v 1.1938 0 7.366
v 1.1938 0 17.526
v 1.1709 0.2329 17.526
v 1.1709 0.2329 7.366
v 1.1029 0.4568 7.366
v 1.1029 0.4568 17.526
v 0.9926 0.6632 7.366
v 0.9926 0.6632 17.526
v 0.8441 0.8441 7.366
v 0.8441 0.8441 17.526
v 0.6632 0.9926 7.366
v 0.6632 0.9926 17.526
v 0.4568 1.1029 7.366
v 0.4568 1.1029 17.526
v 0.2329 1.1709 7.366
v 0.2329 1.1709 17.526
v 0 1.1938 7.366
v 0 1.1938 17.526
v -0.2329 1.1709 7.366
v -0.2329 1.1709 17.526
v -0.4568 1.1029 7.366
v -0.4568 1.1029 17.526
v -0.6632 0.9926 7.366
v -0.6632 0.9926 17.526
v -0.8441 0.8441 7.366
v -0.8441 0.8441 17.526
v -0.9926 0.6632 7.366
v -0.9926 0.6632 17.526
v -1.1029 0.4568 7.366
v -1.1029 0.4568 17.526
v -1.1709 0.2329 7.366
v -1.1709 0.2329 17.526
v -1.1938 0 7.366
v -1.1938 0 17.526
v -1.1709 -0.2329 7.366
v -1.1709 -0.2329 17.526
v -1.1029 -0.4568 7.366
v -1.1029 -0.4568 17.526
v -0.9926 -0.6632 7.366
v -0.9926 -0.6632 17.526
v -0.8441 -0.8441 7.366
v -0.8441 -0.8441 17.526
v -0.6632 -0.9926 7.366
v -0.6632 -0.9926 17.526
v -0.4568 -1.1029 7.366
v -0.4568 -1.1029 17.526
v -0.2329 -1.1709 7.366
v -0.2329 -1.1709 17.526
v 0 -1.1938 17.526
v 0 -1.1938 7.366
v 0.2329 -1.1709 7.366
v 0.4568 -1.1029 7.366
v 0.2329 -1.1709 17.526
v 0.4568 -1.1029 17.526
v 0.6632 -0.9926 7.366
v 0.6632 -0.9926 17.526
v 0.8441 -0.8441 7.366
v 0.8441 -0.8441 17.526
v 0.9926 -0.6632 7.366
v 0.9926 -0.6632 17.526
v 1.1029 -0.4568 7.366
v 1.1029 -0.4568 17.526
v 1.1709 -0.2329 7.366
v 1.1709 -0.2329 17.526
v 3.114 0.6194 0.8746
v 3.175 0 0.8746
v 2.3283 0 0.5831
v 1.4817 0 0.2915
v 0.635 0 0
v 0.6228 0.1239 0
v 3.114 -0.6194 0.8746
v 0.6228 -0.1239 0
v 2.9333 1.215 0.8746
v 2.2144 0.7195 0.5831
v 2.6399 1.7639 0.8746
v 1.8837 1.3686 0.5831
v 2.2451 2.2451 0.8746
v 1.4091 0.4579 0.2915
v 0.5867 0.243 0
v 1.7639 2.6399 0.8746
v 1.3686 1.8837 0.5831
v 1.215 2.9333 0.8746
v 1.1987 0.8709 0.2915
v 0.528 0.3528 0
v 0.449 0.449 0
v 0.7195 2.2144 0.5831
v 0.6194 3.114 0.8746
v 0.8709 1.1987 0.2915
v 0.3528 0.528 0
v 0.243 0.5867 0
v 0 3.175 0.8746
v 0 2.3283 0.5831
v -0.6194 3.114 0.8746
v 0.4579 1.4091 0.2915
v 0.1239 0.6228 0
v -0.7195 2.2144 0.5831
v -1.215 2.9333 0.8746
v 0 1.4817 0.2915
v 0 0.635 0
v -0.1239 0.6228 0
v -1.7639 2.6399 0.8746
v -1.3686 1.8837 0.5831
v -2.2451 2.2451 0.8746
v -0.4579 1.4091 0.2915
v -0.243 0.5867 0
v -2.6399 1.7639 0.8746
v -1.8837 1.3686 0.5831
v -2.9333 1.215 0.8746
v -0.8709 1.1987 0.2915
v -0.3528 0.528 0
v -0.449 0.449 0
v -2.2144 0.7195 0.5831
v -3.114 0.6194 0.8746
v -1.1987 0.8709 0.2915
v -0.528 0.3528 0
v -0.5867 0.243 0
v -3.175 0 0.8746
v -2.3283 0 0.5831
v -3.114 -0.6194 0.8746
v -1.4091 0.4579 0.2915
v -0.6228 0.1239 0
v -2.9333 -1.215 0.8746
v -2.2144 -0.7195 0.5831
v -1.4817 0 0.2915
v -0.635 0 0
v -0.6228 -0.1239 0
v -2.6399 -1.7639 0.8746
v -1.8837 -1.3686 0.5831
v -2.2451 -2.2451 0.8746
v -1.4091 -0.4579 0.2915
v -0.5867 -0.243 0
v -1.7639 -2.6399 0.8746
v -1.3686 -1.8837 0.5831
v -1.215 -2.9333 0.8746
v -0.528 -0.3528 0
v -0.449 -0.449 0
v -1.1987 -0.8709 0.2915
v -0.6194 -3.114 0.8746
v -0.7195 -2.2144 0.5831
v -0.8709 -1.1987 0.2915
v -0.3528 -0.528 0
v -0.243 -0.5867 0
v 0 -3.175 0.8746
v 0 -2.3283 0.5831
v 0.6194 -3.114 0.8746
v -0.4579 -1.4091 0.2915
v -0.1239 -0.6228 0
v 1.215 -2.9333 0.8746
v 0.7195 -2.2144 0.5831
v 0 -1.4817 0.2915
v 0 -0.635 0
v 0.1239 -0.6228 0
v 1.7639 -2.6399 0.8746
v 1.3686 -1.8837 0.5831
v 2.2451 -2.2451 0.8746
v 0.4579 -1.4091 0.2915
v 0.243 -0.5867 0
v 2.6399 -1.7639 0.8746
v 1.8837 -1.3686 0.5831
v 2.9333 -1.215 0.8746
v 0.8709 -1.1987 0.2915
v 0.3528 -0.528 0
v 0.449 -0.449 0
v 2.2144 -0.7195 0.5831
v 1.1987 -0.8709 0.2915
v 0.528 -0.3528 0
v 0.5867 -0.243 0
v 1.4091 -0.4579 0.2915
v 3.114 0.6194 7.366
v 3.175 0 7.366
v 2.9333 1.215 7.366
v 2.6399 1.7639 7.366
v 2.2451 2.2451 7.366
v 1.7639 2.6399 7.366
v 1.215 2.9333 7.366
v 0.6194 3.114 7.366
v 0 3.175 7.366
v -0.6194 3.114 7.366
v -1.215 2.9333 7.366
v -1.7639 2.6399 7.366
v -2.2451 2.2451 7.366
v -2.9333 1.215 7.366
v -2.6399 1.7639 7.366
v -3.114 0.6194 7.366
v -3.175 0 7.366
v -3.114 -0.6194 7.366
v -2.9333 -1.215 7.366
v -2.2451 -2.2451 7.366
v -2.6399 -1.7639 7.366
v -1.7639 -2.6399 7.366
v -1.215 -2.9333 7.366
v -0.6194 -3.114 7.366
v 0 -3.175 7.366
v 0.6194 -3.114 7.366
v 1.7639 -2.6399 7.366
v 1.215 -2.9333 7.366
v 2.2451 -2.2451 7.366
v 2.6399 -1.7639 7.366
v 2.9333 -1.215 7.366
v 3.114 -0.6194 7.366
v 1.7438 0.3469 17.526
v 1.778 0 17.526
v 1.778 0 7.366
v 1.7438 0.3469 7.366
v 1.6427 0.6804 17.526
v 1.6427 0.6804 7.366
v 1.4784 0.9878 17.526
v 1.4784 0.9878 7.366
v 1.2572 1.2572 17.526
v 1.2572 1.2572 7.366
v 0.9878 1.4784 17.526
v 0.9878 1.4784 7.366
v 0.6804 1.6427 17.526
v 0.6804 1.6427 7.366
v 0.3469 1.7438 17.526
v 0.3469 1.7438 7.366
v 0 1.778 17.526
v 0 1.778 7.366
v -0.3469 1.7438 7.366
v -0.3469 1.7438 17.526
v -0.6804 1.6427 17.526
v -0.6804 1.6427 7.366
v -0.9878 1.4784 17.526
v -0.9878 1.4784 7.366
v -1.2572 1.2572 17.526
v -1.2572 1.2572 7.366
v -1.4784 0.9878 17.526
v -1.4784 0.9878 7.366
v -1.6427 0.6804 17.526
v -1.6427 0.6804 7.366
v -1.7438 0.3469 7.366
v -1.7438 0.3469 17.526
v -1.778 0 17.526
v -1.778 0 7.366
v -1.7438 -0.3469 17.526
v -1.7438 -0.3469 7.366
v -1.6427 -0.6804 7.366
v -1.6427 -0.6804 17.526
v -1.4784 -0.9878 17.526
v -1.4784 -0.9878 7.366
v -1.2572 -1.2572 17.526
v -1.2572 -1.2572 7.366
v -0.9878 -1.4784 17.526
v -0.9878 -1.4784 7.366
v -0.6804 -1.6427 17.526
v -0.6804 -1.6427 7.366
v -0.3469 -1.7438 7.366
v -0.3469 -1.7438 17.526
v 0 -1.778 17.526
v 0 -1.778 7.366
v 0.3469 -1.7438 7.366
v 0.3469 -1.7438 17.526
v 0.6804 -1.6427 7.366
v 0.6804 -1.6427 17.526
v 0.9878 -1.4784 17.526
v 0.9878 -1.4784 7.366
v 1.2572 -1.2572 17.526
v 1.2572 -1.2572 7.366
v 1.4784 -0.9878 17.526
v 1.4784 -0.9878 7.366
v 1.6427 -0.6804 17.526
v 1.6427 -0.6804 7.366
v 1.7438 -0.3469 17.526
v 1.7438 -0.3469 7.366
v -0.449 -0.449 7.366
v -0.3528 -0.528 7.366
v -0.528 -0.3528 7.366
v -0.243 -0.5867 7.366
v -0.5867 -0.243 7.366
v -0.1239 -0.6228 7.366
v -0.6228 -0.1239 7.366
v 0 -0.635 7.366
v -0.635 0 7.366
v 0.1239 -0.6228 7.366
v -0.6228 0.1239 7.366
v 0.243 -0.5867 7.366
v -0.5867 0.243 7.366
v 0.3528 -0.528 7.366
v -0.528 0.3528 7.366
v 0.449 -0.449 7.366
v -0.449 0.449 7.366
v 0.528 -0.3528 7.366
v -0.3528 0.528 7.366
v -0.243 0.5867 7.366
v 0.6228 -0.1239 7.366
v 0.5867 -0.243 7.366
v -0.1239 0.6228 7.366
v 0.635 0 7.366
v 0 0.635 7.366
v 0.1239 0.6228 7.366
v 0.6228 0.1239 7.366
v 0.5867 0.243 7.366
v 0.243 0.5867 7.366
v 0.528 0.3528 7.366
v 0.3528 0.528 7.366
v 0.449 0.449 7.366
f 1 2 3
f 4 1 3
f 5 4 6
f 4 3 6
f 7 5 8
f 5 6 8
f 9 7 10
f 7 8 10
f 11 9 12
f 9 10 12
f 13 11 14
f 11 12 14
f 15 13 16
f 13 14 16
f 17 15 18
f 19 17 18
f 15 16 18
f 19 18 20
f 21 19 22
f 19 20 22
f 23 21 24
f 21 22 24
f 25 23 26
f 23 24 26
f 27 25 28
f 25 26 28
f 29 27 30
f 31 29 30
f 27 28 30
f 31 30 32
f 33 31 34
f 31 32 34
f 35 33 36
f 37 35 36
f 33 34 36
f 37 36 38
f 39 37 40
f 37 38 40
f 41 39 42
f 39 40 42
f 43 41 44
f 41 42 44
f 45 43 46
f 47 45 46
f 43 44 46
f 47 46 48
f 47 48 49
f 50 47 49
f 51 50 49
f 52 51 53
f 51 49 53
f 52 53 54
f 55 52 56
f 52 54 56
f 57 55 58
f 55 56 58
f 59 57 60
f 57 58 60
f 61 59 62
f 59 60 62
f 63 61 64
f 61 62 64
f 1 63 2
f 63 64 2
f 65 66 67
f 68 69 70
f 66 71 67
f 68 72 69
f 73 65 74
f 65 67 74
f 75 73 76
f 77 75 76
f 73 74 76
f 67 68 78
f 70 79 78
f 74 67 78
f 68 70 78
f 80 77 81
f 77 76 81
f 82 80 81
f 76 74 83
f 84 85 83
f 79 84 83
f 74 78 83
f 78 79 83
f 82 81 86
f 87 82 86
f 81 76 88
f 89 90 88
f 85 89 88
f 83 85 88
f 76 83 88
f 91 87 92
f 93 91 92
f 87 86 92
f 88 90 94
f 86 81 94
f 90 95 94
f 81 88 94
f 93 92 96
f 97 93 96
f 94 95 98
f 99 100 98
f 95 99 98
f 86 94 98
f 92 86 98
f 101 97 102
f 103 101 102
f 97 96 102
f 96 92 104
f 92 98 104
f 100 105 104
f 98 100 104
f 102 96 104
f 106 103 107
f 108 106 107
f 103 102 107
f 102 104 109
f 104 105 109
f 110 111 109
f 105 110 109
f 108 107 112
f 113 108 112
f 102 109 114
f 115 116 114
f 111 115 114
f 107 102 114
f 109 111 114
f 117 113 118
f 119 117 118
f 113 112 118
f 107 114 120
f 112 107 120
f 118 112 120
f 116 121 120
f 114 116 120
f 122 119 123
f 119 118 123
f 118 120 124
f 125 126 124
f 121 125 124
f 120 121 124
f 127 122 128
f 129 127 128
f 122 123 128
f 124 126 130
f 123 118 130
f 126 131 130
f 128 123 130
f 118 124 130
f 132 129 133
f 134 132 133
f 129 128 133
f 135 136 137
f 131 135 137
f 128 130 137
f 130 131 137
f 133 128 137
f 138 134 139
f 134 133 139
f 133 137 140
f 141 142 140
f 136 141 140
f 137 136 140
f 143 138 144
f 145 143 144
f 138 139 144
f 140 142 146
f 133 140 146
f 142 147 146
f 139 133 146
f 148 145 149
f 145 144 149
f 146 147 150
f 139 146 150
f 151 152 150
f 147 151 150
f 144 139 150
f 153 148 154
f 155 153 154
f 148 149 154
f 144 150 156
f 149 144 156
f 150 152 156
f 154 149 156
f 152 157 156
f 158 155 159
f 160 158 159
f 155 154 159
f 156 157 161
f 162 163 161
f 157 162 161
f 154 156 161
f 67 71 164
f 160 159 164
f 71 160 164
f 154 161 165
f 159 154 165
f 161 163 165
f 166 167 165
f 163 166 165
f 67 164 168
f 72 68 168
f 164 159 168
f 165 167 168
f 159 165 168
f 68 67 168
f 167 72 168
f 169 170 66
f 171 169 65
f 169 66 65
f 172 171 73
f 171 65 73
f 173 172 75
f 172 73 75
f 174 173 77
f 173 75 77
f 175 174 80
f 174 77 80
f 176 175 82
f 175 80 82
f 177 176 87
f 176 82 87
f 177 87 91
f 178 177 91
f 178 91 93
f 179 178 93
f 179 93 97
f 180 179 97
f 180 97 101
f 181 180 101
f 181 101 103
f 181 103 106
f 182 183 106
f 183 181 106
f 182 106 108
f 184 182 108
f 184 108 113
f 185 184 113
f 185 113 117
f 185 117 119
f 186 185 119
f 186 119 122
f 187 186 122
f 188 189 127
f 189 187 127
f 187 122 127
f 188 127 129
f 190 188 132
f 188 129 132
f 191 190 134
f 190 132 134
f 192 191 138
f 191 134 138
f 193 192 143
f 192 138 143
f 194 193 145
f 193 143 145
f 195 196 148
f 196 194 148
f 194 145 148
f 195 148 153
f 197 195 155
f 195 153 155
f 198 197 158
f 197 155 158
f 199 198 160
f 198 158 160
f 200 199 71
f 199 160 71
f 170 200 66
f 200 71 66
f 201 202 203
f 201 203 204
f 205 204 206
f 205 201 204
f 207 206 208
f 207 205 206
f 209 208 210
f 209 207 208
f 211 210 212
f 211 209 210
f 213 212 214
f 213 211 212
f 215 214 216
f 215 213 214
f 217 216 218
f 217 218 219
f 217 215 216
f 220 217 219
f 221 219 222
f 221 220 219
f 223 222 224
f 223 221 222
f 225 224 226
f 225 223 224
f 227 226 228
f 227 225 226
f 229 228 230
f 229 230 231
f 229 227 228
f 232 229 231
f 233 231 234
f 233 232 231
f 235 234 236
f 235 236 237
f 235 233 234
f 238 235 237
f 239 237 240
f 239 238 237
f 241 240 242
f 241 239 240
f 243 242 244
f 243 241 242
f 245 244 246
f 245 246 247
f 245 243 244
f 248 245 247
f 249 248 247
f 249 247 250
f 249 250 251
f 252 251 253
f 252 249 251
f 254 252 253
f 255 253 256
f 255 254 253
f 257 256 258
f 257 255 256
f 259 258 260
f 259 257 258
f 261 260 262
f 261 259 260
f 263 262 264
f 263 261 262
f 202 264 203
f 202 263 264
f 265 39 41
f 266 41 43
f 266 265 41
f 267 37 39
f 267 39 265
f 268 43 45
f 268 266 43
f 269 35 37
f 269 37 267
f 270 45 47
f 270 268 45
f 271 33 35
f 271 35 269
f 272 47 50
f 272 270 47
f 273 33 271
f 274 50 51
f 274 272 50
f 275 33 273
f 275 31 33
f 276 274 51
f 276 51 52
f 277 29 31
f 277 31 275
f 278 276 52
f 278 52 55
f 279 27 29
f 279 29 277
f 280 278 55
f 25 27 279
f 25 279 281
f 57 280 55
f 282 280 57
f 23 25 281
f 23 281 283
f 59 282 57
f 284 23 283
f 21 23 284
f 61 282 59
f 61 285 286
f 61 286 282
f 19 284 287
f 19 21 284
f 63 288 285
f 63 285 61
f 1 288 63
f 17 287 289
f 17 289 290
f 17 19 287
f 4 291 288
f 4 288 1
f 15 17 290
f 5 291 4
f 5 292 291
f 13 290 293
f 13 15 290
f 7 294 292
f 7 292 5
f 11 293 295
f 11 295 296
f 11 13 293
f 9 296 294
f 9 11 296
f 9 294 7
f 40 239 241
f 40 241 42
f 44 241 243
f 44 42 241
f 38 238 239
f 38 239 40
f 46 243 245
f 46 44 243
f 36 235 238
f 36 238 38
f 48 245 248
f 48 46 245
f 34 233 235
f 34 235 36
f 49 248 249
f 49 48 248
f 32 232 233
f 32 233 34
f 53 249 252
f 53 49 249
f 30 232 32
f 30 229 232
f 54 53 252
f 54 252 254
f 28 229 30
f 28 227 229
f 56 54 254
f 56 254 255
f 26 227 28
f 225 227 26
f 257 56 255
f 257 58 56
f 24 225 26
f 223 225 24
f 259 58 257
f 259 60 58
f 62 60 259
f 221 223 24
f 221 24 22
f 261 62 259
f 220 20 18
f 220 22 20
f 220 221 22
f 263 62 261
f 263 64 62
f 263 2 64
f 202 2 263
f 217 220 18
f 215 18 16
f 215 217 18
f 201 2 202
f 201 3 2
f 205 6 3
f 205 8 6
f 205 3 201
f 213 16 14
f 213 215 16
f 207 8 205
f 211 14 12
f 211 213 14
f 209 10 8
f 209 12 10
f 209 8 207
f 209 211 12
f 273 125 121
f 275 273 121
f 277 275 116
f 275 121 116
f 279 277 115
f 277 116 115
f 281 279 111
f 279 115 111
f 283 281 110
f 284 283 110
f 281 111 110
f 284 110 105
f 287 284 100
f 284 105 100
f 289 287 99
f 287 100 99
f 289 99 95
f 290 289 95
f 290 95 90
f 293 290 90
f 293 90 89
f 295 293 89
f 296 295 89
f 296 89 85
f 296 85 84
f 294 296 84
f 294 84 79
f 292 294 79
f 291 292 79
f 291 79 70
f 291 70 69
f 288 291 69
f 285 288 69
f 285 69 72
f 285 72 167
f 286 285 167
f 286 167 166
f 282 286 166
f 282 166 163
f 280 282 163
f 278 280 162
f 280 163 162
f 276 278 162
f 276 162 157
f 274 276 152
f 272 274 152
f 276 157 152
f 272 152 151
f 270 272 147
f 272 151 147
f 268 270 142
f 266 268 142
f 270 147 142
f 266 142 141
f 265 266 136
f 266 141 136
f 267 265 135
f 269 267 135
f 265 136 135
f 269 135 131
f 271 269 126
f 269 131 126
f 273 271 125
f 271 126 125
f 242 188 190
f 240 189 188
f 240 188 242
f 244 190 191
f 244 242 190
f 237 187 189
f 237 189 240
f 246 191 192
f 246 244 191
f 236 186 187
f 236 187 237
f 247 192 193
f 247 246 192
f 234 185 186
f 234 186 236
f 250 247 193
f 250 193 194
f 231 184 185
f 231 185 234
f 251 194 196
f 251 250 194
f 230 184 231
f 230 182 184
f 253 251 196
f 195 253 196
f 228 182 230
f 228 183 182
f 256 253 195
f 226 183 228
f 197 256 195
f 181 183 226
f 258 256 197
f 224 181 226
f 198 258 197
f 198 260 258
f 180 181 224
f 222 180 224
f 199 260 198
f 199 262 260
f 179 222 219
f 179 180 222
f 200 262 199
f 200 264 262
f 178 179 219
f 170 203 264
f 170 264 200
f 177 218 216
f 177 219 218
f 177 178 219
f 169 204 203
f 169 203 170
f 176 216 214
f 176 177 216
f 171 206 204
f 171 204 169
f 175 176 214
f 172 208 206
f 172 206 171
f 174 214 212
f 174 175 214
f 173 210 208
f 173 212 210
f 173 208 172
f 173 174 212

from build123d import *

# Parameters (mm, degrees)
SKETCH1_R           = 3.175
BOSS_EXTRUDE1_DEPTH = 17.526
SKETCH2_OUTSIDE_W   = 12.288
SKETCH2_OUTSIDE_H   = 12.288
SKETCH2_OUTSIDE_R   = 1.778
CUT_EXTRUDE1_DEPTH  = 10.16
SKETCH3_R           = 1.1938
CUT_EXTRUDE2_DEPTH  = 10.16
SKETCH5_R           = 0.635
CUT_EXTRUDE3_DEPTH  = 7.62
CHAMFER1_SIZE       = 0.874592138
CHAMFER1_SIZE_2     = 2.54


with BuildPart() as part:
    # Sketch1 → Boss-Extrude1 (new body)
    with BuildSketch(Plane.XY):
        Circle(SKETCH1_R)
    extrude(amount=BOSS_EXTRUDE1_DEPTH)

    # Sketch2 outside → Cut-Extrude1 (cut)
    with BuildSketch(Plane.XY.offset(17.526)):
        Rectangle(SKETCH2_OUTSIDE_W, SKETCH2_OUTSIDE_H)
        Circle(SKETCH2_OUTSIDE_R, mode=Mode.SUBTRACT)
    extrude(amount=-CUT_EXTRUDE1_DEPTH, mode=Mode.SUBTRACT)

    # Sketch3 → Cut-Extrude2 (cut)
    with BuildSketch(Plane.XY.offset(17.526)):
        Circle(SKETCH3_R)
    extrude(amount=-CUT_EXTRUDE2_DEPTH, mode=Mode.SUBTRACT)

    # Sketch5 → Cut-Extrude3 (cut)
    with BuildSketch(Plane(origin=(0, 0, 0), x_dir=(-1, 0, 0), z_dir=(0, 0, -1))):
        Circle(SKETCH5_R)
    extrude(amount=-CUT_EXTRUDE3_DEPTH, mode=Mode.SUBTRACT)

    # Chamfer1
    # the kernel refuses this chamfer: 2.54, 0.874592138 mm, written as the material it takes off along each edge
    with BuildSketch(Plane(origin=(0, 0, 0), x_dir=(1, 0, 0), z_dir=(0, -1, 0))) as chamfer1_piece_1:
        Polygon((3.175, CHAMFER1_SIZE), (3.175 - CHAMFER1_SIZE_2, 0), (3.175, 0), align=None)
    revolve(axis=Axis((0, 0, 0), (0, 0, 1)), mode=Mode.SUBTRACT)


solid = part.part
